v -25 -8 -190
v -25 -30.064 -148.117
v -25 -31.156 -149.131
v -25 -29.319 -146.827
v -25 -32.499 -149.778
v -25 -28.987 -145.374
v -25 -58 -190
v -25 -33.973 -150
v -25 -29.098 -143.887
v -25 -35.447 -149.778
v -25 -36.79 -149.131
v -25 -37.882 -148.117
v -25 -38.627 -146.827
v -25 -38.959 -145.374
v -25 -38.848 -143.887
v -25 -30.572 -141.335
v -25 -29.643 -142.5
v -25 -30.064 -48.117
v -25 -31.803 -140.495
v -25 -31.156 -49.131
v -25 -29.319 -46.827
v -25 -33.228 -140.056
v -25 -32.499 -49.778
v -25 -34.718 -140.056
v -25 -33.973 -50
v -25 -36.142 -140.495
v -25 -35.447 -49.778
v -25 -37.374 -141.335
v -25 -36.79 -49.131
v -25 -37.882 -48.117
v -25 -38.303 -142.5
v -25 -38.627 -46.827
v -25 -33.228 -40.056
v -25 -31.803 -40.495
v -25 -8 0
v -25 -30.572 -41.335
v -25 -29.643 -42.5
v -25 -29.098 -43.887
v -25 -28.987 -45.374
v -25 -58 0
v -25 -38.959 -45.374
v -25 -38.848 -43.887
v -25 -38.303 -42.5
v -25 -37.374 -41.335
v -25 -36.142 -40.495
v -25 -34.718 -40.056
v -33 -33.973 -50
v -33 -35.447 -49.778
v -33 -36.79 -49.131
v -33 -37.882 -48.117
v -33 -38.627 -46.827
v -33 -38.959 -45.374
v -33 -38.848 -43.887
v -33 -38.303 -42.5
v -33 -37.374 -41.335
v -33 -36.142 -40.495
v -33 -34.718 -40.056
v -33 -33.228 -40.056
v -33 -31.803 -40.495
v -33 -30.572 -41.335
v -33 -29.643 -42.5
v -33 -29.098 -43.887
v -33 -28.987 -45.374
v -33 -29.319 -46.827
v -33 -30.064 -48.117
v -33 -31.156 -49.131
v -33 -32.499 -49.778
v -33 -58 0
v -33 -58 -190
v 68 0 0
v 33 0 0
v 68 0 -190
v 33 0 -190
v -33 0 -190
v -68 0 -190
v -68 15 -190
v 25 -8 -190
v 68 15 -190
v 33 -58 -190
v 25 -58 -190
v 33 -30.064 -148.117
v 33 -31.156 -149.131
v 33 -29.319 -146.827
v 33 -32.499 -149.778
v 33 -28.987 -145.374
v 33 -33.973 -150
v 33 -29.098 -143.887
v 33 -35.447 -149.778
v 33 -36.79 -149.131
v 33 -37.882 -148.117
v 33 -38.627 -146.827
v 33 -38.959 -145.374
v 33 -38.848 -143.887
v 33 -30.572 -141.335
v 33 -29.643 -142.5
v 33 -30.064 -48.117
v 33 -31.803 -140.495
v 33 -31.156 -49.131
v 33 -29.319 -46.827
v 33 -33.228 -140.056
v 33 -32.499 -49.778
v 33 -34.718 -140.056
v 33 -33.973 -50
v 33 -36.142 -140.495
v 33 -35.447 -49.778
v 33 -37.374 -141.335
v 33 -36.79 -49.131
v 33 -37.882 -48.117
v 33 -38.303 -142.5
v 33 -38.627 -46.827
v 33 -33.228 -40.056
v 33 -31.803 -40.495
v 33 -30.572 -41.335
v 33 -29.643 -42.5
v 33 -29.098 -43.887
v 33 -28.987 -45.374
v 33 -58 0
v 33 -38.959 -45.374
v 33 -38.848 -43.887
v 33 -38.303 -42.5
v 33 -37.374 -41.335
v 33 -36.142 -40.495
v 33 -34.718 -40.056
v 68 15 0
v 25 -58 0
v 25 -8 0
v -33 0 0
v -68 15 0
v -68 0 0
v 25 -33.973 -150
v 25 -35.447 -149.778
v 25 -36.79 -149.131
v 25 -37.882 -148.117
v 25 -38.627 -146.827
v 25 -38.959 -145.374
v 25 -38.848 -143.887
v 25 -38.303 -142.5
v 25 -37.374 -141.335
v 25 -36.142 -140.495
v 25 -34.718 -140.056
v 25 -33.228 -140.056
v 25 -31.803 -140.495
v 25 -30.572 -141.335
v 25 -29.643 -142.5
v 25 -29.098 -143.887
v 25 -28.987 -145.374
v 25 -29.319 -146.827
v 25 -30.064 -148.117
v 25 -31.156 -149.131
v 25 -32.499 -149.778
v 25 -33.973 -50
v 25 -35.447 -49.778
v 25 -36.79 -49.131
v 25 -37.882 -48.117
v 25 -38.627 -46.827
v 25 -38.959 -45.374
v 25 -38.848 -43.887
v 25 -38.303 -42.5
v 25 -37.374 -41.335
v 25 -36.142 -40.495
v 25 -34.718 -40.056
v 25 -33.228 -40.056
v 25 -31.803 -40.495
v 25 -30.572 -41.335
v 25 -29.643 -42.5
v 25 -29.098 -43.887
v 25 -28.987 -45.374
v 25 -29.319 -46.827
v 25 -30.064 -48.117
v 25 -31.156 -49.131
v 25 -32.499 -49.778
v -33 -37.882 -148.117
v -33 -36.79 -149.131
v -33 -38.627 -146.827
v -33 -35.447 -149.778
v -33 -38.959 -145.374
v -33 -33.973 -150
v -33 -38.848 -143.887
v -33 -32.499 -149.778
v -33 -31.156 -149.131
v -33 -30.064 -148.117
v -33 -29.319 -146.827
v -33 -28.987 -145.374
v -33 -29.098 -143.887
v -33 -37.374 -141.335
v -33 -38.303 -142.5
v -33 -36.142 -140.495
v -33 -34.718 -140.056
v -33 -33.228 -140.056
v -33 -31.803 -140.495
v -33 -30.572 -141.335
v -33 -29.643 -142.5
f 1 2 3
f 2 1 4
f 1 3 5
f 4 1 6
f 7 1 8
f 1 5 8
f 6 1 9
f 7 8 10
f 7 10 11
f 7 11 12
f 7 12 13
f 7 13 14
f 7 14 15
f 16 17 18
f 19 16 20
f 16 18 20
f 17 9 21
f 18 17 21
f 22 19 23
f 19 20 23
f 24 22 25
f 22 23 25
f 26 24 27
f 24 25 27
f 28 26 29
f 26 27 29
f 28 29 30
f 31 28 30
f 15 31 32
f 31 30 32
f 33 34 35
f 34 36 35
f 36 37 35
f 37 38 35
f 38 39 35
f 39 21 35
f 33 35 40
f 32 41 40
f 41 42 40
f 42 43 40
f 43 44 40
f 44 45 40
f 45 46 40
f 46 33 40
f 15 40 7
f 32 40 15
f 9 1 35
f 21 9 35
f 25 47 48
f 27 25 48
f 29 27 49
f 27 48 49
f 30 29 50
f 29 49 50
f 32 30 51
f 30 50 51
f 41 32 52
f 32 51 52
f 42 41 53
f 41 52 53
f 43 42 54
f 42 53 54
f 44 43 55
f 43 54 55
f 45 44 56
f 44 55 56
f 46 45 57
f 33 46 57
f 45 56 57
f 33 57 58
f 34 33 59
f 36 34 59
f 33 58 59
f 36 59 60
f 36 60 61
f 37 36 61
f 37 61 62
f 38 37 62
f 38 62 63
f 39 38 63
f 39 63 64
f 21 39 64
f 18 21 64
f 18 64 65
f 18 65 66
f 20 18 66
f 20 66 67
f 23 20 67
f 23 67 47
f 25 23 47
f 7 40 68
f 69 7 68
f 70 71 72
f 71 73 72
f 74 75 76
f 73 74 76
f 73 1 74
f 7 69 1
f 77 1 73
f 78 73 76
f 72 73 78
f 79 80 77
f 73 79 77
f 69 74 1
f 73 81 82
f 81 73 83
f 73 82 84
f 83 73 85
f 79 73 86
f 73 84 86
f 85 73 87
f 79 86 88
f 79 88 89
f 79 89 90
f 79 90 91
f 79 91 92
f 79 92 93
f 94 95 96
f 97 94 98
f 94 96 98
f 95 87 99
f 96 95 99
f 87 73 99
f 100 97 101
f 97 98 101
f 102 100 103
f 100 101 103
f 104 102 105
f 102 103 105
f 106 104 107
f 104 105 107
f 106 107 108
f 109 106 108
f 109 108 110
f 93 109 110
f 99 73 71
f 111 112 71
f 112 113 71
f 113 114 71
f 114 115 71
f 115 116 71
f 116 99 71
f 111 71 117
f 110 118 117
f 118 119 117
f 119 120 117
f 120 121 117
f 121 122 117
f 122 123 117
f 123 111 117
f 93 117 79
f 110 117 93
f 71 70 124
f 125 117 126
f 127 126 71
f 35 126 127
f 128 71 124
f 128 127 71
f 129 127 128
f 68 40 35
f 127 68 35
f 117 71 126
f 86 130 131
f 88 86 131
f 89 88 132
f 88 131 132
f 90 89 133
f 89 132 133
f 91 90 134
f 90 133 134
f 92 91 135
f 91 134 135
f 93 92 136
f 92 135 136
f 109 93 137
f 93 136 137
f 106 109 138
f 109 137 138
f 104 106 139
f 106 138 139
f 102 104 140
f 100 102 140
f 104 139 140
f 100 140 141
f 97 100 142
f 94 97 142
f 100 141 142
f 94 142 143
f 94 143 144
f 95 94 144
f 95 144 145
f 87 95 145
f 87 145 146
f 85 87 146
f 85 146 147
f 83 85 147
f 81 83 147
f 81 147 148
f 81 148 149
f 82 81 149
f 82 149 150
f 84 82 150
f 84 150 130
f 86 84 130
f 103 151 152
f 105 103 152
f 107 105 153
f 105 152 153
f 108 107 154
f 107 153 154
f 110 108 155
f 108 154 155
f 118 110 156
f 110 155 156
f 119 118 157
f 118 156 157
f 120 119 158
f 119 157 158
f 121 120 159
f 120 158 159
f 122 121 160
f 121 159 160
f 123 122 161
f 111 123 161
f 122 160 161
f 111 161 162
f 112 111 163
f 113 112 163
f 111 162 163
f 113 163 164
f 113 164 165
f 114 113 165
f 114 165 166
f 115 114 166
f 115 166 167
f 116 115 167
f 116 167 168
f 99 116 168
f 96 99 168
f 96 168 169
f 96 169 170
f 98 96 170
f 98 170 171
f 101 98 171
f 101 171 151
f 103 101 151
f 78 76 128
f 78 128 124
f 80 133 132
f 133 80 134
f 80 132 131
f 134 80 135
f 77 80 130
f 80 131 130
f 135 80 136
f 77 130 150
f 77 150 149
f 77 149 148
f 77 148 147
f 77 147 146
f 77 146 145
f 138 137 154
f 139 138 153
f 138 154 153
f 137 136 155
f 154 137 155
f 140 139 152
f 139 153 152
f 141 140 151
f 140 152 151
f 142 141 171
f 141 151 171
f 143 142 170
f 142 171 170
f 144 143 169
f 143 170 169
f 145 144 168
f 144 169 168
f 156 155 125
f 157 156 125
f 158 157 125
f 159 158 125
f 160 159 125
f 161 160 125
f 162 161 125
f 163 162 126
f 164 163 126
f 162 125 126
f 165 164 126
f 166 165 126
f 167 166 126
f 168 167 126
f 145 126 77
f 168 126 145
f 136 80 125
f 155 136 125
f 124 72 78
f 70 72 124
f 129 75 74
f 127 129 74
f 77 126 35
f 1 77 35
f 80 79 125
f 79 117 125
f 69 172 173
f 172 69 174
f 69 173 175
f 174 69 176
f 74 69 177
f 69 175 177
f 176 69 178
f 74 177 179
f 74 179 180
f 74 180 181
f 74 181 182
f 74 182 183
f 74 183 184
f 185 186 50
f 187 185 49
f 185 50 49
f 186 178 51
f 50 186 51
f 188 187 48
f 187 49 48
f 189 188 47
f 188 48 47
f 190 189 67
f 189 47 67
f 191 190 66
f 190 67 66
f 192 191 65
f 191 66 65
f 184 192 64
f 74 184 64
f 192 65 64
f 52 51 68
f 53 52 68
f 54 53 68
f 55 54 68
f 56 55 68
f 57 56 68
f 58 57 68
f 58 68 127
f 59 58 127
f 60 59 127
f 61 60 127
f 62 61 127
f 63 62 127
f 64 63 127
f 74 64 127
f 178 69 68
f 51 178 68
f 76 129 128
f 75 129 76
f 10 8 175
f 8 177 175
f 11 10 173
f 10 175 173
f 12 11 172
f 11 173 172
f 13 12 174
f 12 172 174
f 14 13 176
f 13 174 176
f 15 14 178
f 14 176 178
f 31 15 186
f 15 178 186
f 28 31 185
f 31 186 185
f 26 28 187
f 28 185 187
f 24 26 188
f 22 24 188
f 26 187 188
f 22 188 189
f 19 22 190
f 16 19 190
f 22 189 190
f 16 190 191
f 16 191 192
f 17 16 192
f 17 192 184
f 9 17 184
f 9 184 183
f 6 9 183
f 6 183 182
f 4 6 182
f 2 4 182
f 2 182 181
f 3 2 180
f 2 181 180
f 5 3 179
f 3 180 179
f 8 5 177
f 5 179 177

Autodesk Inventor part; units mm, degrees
ref_plane "YZ Plane" through (0, 0, 0) normal (1, 0, 0) x (0, 1, 0)
ref_plane "XZ Plane" through (0, 0, 0) normal (0, 1, 0) x (-1, 0, 0)
ref_plane "XY Plane" through (0, 0, 0) normal (0, 0, 1) x (1, 0, 0)
sketch "Sketch1" plane through (0, 0, 0) normal (0, 0, 1) x (1, 0, 0)
  line L0 (-33, 0) -> (33, 0)
  line L1 (33, 0) -> (33, -58)
  line L2 (33, -58) -> (-33, -58)
  line L3 (-33, -58) -> (-33, 0)
  point P0 (0, 0)
  dimension "d0" = 58
  dimension "d1" = 66
  dimension "d2" = 33
  dimension "d3" = 0
extrude "clamp_base" add sketch "Sketch1" against normal blind 190
sketch "Sketch2" plane through (0, 0, 0) normal (0, 0, 1) x (1, 0, 0)
  line L0 (-25, -58) -> (25, -58)
  line L1 (25, -58) -> (25, -8)
  line L2 (25, -8) -> (-25, -8)
  line L3 (-25, -8) -> (-25, -58)
  line L4 (-33, -58) -> (33, -58) projected
  point P0 (0, 0)
  dimension "d6" = 50
  dimension "d7" = 50
  dimension "d8" = 25
extrude "clamp_extrusion" cut sketch "Sketch2" against normal through all
sketch "Sketch4" plane through (-33, 0, 0) normal (0, 1, 0) x (1, 0, 0)
  line L0 (-35, 190) -> (101, 190)
  line L1 (101, 190) -> (101, 0)
  line L2 (101, 0) -> (-35, 0)
  line L3 (-35, 0) -> (-35, 190)
  line L4 (66, 0) -> (0, 0) projected
  line L5 (0, 190) -> (66, 190) projected
  line L6 (0, 0) -> (0, 190) projected
  line L7 (66, 0) -> (66, 190) projected
  point P0 (33, 0)
  dimension "d35" = 0
  dimension "d36" = 0
  dimension "d37" = 35
  dimension "d38" = 35
extrude "platform" add sketch "Sketch4" along normal blind 15
sketch "Sketch8" plane through (33, -58, 0) normal (1, 0, 0) x (0, 0, -1)
  line L0 (0, 0) -> (0, 58) projected
  line L1 (190, 58) -> (190, 0) projected
  point P0 (45, 24.0271)
  point P1 (145, 24.0271)
  dimension "d51" = 45
  dimension "d60" = 100
  dimension "d61" = 190
hole "clampHole" at (33, -33.9729, -45) at (33, -33.9729, -145) direction (-1, 0, 0) diameter 10 end through all
equation "\"d0\" = support_frame_squareBarDimension + support_baseClamp_thickness"
equation "\"d1\" = support_frame_squareBarDimension + 2 * support_baseClamp_thickness"
equation "\"d2\" = 0.5 * d1"
equation "\"d4\" = width"
equation "\"d6\" = support_frame_squareBarDimension"
equation "\"d7\" = support_frame_squareBarDimension"
equation "\"d8\" = 0.5 * d6"
equation "\"d37\" = support_baseClamp_platformLengthBuffer"
equation "\"d38\" = support_baseClamp_platformLengthBuffer"
equation "\"d13\" = support_baseClamp_platformThickness"
equation "\"d51\" = -0.5 * d60 + 0.5 * d61"
equation "\"d60\" = clampHoleSpacing"
equation "\"d53\" = clampHoleDiameter"
equation "\"width\" = clampHoleDiameter + clampHoleSpacing + 2 * buffer"
equation "\"clampHoleSpacing\" = support_frame_clampHoleSpacing"
equation "\"clampHoleDiameter\" = support_frame_clampHoleDiameter"
equation "\"sleeveHoleDiameter\" = support_baseClamp_sleeveHoleDiameter"
equation "\"theta\" = hoop_angle_z"
equation "\"phi\" = support_baseClamp_sleeveSweepTerminationAngle"
equation "\"support_frame_squareBarDimension\" = 50"
equation "\"support_baseClamp_thickness\" = 8"
equation "\"support_baseClamp_sleeveHoleDiameter\" = 12"
equation "\"hoop_angle_z\" = 45deg"
equation "\"support_baseClamp_sleeveSweepTerminationAngle\" = 55deg"
equation "\"support_baseClamp_platformThickness\" = 15"
equation "\"support_baseClamp_platformWidthBuffer\" = 0"
equation "\"support_baseClamp_platformLengthBuffer\" = 35"
equation "\"rack_tooth_thickness\" = 5"
equation "\"rack_tooth_addendum\" = 5"
equation "\"rack_tooth_dedendum\" = 5"
equation "\"hoop_bearing_length\" = 5deg"
equation "\"hoop_cable_diam\" = 5"
equation "\"hoop_cable_pulley_diam\" = 22"
equation "\"secure_arm_radii\" = 9"
equation "\"secure_arm_hold_length\" = 35"
equation "\"secure_arm_angle\" = 20deg"
equation "\"support_frame_endHoleBuffer\" = 25"
equation "\"hoop_tabs_thickness\" = 6"
equation "\"support_frame_squareBarThickness\" = 5"
equation "\"wheelchair_deployed_length\" = 1067"
equation "\"wheelchair_deployed_height\" = 914"
equation "\"hoop_tabs_hole\" = 12"
equation "\"wheelchair_deployed_width\" = 635"
equation "\"support_frame_squareBarFillet\" = 2"
equation "\"sm_varx_pinPlate_thickness\" = 5"
equation "\"sm_varx_member_tolerance\" = 0.5"
equation "\"sm_varx_pinPlate_holeDiameter\" = 5"
equation "\"sm_varx_squareBarThickness\" = 2.5"
equation "\"buffer\" = 40"
equation "\"support_frame_clampHoleSpacing\" = 100"
equation "\"support_frame_clampHoleDiameter\" = 10"
properties part number "support_basePart_nosleeve" material "Steel, High Strength, Low Alloy"
